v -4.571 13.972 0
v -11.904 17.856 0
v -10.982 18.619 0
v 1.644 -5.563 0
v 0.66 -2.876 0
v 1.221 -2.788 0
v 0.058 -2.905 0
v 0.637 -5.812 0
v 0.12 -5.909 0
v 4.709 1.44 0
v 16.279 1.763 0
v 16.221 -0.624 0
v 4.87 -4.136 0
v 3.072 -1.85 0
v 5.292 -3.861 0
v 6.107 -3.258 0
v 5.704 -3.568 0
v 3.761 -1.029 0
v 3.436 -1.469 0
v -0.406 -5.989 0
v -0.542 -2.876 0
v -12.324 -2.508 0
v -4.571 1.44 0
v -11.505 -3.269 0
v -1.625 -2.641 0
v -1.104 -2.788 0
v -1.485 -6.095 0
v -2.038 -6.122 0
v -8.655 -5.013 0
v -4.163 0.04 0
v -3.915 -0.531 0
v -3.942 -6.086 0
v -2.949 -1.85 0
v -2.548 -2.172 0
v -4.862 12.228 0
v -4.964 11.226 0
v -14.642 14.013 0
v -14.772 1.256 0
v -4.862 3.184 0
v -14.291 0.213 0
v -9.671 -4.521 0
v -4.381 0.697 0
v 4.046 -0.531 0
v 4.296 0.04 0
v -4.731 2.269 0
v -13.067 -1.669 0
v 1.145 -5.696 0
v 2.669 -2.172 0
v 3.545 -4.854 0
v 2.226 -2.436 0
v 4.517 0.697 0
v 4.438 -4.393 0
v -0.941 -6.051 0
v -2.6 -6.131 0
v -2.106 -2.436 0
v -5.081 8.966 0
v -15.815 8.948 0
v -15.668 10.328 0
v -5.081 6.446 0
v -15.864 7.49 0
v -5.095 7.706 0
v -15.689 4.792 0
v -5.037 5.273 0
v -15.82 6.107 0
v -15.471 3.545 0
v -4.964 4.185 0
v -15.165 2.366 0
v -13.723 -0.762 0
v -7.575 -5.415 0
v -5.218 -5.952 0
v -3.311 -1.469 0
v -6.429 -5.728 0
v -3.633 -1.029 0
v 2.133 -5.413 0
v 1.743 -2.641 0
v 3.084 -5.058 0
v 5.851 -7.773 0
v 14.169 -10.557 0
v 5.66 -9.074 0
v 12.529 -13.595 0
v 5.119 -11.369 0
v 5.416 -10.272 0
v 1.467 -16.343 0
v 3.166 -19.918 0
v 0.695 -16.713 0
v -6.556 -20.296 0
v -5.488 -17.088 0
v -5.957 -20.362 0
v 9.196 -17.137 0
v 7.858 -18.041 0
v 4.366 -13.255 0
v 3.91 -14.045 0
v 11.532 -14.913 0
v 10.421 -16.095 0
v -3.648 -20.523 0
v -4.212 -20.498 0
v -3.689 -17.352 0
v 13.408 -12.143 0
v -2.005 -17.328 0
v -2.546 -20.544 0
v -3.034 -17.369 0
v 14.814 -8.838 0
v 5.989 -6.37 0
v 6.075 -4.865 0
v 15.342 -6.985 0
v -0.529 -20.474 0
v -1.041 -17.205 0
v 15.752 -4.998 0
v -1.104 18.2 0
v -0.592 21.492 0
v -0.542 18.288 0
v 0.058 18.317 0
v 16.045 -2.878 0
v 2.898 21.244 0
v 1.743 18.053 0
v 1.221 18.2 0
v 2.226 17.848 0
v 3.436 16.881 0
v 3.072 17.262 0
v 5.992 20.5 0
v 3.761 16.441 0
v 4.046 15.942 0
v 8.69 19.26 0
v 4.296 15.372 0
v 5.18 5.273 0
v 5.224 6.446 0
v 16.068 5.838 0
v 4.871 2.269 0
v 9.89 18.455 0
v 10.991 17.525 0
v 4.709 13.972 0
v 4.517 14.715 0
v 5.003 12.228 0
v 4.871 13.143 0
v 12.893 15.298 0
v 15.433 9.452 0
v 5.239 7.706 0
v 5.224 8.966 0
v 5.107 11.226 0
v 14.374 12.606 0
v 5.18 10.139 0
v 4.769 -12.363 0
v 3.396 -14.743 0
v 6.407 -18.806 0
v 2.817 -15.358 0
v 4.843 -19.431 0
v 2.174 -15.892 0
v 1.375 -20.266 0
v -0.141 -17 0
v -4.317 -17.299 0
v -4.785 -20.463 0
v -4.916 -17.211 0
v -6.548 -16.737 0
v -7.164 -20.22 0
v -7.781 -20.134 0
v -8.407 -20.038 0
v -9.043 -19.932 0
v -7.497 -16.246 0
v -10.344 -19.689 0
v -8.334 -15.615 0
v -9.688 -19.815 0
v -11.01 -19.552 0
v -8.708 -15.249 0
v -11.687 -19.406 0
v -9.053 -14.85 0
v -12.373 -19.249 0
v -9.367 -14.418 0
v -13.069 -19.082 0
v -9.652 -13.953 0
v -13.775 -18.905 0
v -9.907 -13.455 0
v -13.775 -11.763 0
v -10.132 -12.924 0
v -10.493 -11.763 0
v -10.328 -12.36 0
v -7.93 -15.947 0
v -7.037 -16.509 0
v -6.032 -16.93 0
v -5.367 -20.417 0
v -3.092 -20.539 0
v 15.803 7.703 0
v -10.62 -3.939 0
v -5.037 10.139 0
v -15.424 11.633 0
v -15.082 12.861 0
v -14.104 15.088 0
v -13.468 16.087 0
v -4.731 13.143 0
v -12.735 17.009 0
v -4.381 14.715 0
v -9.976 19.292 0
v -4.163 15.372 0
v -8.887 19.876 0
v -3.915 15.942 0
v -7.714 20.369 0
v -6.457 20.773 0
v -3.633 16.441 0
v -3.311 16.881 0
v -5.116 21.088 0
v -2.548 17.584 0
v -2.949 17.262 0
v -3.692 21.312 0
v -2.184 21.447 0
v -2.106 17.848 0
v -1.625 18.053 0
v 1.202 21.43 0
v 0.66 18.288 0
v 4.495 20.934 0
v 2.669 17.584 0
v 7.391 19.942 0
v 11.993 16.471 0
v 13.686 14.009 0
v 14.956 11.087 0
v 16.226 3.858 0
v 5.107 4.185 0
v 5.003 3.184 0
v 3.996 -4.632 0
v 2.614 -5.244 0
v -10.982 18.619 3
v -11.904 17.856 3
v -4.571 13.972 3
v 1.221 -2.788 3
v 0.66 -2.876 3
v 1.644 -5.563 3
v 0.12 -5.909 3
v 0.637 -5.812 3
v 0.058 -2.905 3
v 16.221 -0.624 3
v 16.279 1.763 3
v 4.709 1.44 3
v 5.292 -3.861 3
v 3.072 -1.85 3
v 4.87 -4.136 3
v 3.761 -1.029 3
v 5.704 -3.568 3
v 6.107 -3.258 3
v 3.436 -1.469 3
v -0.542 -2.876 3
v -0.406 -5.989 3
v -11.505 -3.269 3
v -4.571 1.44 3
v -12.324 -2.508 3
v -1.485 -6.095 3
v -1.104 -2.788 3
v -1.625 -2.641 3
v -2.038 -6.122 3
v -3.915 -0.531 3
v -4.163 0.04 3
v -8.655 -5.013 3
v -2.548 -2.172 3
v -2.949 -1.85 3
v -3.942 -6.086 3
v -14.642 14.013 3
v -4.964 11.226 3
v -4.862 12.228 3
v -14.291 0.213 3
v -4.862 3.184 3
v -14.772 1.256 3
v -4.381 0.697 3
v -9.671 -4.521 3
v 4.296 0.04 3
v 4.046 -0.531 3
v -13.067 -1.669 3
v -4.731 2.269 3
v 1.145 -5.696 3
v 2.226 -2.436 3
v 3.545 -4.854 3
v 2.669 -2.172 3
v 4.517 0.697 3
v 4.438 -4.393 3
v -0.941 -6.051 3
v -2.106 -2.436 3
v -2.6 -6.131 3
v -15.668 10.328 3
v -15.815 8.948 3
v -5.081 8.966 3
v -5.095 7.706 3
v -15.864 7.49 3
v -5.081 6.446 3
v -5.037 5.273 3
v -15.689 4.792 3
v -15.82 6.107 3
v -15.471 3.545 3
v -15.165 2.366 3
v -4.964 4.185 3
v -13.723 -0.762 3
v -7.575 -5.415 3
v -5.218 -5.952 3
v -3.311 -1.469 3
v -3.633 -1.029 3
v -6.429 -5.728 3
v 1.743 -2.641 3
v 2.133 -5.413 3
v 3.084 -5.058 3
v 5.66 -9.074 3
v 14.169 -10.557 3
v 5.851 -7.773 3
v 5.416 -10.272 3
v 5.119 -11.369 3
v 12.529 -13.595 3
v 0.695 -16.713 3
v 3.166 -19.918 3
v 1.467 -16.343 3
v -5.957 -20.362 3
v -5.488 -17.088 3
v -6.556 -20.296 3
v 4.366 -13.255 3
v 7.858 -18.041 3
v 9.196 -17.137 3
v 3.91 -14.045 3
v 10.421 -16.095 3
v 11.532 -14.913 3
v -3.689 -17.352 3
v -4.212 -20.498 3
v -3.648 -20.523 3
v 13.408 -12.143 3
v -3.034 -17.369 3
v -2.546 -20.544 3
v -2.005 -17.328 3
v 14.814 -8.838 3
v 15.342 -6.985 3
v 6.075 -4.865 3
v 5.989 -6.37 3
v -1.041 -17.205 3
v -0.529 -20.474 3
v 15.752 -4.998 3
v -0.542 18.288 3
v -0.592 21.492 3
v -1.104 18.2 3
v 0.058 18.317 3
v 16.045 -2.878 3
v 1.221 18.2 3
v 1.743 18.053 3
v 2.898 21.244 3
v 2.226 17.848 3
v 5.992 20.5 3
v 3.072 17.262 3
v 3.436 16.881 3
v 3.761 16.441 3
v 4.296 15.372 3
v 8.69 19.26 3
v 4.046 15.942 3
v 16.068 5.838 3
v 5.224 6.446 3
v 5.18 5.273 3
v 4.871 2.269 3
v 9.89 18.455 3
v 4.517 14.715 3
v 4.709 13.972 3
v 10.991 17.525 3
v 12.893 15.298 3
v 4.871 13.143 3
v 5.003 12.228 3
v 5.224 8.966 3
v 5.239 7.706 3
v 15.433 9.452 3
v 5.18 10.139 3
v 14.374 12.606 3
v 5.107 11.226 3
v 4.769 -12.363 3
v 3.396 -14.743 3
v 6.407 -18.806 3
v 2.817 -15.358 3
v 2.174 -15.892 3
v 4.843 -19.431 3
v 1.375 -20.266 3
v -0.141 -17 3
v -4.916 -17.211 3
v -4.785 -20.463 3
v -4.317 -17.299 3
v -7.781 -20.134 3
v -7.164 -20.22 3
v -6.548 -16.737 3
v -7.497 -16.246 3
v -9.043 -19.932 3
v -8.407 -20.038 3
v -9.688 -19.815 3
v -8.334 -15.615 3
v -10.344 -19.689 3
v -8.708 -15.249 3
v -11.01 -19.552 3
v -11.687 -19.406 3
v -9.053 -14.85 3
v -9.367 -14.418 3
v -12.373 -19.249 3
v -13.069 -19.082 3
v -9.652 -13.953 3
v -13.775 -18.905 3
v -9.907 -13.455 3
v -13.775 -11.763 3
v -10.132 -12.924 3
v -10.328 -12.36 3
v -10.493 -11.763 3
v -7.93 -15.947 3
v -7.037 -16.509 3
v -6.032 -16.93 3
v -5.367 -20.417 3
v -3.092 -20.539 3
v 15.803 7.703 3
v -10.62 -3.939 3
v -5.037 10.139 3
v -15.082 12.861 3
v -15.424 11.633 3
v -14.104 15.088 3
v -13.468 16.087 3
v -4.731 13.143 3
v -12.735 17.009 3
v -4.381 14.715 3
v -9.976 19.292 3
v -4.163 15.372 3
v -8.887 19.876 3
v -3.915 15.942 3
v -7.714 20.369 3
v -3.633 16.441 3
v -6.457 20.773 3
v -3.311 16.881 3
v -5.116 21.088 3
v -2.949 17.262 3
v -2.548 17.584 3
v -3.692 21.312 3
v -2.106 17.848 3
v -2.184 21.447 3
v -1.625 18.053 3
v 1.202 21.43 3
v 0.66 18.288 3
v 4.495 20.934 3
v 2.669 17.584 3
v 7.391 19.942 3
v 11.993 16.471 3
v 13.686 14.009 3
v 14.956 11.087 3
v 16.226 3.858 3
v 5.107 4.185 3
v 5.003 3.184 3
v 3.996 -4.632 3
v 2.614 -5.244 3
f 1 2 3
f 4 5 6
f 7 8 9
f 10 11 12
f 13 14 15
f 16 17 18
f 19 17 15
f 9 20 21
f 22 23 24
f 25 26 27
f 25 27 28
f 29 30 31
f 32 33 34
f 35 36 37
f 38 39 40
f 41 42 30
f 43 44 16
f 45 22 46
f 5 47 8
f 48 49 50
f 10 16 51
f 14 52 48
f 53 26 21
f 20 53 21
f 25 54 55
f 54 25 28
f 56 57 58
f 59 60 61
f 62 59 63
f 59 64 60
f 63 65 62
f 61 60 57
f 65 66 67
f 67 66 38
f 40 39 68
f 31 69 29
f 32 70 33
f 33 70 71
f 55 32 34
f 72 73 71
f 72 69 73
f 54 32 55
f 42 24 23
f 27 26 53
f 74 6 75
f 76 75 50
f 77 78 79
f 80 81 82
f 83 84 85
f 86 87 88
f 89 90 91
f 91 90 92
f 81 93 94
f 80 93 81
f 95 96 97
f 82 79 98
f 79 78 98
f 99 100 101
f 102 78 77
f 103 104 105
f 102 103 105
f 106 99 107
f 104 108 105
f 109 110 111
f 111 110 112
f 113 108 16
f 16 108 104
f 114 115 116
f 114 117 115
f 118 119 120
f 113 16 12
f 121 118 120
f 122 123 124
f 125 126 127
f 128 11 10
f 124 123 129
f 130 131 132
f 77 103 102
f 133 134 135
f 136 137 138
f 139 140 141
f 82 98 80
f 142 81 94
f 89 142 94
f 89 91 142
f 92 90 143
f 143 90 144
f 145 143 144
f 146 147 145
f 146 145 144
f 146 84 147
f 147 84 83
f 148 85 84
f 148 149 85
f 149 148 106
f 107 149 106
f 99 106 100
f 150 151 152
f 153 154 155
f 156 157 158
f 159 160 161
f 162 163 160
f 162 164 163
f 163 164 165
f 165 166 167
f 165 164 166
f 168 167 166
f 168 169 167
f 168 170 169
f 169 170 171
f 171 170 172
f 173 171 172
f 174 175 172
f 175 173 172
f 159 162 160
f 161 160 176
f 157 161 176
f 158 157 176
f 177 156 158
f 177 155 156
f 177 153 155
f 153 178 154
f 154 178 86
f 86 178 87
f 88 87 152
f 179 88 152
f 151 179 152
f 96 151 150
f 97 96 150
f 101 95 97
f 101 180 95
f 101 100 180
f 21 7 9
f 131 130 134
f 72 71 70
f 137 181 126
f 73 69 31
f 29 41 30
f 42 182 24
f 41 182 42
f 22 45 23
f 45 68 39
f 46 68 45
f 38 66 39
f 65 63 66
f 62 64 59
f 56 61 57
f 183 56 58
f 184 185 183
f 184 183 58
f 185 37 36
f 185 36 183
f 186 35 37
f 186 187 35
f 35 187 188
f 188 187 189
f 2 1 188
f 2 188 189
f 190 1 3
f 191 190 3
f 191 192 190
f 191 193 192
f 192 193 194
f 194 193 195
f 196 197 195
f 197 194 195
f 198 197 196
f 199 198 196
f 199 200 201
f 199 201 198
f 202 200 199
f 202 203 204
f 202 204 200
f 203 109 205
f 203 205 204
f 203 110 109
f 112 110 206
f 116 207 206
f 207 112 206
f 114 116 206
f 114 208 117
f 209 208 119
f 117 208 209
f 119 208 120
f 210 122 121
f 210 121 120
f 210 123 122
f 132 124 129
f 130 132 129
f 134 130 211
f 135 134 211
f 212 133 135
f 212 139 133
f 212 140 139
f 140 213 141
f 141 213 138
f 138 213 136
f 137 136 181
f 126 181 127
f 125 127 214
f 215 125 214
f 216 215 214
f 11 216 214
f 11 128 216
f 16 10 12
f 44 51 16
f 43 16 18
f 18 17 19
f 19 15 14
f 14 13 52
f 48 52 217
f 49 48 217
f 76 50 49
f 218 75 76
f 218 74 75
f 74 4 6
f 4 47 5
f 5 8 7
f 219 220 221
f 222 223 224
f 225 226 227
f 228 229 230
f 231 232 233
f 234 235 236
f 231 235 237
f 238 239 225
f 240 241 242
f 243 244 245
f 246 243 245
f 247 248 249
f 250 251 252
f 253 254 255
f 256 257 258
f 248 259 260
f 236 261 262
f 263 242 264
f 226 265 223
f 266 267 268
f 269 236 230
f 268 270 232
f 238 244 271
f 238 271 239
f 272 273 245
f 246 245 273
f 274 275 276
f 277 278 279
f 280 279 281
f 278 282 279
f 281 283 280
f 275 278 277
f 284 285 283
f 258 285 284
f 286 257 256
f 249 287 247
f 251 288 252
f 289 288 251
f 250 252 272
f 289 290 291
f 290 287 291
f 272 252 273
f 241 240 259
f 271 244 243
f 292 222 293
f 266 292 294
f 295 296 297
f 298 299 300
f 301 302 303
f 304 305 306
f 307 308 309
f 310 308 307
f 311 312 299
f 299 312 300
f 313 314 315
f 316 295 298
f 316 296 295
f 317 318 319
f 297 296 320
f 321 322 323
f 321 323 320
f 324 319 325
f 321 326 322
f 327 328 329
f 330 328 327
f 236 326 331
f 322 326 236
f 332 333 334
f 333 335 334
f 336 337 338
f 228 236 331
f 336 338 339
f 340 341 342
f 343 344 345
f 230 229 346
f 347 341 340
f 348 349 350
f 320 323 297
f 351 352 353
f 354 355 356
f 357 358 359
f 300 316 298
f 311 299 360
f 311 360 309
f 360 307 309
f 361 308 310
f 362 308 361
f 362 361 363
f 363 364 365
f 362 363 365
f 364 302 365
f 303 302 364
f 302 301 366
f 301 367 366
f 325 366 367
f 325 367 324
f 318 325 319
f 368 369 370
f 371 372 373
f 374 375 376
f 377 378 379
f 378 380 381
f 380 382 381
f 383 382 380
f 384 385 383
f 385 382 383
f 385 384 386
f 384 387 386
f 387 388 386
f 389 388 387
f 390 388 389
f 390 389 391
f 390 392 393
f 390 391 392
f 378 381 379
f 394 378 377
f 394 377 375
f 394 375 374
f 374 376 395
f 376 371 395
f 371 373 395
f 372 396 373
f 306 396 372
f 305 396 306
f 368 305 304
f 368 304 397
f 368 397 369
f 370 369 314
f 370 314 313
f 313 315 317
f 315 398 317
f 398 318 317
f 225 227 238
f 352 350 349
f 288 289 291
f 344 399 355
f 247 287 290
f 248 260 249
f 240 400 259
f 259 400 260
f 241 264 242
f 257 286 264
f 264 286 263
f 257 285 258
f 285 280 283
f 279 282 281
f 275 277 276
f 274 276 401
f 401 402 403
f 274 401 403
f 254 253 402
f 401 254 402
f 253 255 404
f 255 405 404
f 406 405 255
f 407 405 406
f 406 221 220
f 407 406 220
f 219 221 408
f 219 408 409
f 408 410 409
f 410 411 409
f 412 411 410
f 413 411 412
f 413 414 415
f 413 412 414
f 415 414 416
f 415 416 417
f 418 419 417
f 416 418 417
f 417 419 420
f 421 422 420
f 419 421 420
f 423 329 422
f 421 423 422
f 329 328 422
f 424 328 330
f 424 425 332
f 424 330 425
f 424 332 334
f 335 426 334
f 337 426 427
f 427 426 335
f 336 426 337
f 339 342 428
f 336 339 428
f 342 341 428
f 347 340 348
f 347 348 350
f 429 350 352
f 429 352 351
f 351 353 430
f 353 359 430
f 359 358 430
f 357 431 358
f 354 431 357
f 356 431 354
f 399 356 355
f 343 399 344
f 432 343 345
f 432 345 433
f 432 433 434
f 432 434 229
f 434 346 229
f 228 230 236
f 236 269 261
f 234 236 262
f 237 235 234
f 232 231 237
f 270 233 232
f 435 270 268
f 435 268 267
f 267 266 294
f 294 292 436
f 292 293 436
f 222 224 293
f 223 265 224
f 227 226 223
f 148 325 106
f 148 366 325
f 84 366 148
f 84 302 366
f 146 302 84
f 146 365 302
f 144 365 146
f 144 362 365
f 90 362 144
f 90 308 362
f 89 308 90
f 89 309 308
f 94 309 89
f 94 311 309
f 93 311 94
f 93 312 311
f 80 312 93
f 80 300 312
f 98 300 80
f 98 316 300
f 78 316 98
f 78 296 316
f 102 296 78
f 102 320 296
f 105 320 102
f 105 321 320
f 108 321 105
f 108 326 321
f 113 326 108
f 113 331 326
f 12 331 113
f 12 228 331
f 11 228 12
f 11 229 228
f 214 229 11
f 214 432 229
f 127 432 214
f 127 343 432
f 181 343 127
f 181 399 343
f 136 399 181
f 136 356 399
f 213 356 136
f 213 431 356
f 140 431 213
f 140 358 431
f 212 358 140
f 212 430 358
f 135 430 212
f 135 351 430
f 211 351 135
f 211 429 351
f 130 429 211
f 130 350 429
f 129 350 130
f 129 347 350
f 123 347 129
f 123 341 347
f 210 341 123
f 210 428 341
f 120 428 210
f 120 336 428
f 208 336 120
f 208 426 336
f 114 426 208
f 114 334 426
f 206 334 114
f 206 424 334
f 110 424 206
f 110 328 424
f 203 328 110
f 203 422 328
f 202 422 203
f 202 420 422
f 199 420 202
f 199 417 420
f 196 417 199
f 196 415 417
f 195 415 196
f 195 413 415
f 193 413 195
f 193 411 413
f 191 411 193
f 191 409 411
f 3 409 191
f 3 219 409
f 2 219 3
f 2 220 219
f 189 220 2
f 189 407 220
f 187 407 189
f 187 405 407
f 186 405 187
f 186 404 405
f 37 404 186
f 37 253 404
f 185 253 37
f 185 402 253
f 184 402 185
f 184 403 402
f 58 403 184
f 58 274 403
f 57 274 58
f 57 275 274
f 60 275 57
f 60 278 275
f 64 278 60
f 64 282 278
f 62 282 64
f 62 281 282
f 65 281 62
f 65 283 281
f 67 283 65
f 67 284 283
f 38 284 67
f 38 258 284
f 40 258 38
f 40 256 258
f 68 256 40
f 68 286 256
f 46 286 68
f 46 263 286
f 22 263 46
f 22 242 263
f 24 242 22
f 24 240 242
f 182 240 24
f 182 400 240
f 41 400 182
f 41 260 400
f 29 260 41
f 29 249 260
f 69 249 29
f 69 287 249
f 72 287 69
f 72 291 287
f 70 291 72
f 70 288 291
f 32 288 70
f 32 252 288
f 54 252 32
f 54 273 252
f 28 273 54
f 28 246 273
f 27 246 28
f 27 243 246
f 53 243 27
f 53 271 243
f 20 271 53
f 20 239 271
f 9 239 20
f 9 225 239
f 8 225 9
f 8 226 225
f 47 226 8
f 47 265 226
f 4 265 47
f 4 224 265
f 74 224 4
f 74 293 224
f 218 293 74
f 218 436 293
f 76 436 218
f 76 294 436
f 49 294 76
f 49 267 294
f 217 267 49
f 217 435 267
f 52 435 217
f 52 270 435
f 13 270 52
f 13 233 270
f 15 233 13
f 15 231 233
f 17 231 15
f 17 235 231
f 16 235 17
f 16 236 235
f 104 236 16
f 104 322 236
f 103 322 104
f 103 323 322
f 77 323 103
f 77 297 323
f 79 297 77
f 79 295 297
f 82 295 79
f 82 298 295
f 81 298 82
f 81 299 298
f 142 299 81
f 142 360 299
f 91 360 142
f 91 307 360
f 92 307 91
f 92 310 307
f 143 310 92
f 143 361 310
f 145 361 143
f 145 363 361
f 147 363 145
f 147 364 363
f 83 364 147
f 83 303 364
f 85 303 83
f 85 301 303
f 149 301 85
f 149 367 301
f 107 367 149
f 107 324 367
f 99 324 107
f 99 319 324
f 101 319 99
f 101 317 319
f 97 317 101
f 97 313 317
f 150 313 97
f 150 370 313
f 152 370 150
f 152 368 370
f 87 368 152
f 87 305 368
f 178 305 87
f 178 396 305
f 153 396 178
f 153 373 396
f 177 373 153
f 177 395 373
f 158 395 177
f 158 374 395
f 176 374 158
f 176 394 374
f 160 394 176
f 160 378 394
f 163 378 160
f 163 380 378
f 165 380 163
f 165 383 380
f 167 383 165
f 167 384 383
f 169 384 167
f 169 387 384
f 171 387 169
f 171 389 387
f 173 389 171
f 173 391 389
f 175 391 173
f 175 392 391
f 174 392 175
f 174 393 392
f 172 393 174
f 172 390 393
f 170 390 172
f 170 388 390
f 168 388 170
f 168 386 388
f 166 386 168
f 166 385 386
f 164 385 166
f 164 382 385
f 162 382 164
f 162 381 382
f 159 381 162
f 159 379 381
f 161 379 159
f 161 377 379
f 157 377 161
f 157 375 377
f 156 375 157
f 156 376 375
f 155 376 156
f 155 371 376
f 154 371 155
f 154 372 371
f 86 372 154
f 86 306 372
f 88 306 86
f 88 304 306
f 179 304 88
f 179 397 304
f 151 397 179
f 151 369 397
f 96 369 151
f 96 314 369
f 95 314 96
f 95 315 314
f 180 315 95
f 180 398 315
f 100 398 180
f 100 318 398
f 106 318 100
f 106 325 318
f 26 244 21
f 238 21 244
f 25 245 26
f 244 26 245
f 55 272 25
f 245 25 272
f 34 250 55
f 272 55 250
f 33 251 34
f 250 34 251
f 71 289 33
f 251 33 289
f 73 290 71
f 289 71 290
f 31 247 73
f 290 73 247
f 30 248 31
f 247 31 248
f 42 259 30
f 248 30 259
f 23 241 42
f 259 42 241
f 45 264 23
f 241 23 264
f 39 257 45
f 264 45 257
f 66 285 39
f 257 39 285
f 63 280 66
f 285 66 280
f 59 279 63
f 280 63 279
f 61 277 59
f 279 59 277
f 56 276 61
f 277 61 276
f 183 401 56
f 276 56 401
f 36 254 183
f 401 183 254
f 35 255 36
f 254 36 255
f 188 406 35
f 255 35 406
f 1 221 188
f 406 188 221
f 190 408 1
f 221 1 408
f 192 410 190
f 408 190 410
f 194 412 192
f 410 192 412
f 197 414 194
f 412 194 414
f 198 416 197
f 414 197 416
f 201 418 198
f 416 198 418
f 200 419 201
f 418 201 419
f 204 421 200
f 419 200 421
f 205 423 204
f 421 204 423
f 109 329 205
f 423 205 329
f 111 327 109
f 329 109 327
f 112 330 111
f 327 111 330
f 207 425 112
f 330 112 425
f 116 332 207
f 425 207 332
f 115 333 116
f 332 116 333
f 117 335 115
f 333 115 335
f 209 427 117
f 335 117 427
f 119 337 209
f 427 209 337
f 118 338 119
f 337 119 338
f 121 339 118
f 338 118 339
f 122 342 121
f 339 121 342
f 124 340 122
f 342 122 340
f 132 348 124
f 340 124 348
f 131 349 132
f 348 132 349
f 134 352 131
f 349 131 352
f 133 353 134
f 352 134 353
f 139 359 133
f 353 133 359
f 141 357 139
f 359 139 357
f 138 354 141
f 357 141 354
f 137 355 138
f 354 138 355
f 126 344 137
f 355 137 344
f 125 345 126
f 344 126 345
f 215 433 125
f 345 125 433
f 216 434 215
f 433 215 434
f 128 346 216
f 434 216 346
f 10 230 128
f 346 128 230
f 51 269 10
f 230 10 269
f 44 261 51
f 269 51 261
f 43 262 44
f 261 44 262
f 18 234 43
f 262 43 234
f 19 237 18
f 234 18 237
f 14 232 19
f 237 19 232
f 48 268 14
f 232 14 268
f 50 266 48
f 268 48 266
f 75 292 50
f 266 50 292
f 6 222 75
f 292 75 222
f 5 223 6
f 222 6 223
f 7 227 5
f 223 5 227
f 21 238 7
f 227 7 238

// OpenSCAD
// file: syms.scad
module symY(t) {
    translate(t)
        children();
    mirror([0,1,0])
        translate(t)
            children();
}
module symX(t) {
    translate(t)
        children();
    mirror([1,0,0])
        translate(t)
            children();
}

module symZ(t) {
    translate(t)
        children();
    mirror([0,0,1])
        translate(t)
            children();
}

module	symXY(t) {
	tx=t[0];
	ty=t[1];
	tz=t[2];
	symX([tx,0,0])
	symY([0,ty,tz])
		children();
}

module magnetCut(D,S) {
    cylinder(d=D,h=10);
    for(d=[45,-45])
    rotate(d)
    cube([2*D,S,30],center=true);
}


// calculates the radius from "segment" paramers:
// https://en.wikipedia.org/wiki/Circular_segment
function    circleSlice2radius2(c,h) = (c*c/8/h)+ h/2;
// main file
use<syms.scad>;
$fn=64;

mode="9";
    linear_extrude(height=3)
    text(mode,
        size=40,
        font=
    //"Lato:style=Black",
    //"Ataxia Outline BRK:style=Regular",
    //"Gillius ADF:style=Bold",
    "Georgia:style=Bold",
    //"GFS Didot:style=Bold",
    //"Bitstream Vera Sans:style=Bold",
        halign="center",valign="center");
